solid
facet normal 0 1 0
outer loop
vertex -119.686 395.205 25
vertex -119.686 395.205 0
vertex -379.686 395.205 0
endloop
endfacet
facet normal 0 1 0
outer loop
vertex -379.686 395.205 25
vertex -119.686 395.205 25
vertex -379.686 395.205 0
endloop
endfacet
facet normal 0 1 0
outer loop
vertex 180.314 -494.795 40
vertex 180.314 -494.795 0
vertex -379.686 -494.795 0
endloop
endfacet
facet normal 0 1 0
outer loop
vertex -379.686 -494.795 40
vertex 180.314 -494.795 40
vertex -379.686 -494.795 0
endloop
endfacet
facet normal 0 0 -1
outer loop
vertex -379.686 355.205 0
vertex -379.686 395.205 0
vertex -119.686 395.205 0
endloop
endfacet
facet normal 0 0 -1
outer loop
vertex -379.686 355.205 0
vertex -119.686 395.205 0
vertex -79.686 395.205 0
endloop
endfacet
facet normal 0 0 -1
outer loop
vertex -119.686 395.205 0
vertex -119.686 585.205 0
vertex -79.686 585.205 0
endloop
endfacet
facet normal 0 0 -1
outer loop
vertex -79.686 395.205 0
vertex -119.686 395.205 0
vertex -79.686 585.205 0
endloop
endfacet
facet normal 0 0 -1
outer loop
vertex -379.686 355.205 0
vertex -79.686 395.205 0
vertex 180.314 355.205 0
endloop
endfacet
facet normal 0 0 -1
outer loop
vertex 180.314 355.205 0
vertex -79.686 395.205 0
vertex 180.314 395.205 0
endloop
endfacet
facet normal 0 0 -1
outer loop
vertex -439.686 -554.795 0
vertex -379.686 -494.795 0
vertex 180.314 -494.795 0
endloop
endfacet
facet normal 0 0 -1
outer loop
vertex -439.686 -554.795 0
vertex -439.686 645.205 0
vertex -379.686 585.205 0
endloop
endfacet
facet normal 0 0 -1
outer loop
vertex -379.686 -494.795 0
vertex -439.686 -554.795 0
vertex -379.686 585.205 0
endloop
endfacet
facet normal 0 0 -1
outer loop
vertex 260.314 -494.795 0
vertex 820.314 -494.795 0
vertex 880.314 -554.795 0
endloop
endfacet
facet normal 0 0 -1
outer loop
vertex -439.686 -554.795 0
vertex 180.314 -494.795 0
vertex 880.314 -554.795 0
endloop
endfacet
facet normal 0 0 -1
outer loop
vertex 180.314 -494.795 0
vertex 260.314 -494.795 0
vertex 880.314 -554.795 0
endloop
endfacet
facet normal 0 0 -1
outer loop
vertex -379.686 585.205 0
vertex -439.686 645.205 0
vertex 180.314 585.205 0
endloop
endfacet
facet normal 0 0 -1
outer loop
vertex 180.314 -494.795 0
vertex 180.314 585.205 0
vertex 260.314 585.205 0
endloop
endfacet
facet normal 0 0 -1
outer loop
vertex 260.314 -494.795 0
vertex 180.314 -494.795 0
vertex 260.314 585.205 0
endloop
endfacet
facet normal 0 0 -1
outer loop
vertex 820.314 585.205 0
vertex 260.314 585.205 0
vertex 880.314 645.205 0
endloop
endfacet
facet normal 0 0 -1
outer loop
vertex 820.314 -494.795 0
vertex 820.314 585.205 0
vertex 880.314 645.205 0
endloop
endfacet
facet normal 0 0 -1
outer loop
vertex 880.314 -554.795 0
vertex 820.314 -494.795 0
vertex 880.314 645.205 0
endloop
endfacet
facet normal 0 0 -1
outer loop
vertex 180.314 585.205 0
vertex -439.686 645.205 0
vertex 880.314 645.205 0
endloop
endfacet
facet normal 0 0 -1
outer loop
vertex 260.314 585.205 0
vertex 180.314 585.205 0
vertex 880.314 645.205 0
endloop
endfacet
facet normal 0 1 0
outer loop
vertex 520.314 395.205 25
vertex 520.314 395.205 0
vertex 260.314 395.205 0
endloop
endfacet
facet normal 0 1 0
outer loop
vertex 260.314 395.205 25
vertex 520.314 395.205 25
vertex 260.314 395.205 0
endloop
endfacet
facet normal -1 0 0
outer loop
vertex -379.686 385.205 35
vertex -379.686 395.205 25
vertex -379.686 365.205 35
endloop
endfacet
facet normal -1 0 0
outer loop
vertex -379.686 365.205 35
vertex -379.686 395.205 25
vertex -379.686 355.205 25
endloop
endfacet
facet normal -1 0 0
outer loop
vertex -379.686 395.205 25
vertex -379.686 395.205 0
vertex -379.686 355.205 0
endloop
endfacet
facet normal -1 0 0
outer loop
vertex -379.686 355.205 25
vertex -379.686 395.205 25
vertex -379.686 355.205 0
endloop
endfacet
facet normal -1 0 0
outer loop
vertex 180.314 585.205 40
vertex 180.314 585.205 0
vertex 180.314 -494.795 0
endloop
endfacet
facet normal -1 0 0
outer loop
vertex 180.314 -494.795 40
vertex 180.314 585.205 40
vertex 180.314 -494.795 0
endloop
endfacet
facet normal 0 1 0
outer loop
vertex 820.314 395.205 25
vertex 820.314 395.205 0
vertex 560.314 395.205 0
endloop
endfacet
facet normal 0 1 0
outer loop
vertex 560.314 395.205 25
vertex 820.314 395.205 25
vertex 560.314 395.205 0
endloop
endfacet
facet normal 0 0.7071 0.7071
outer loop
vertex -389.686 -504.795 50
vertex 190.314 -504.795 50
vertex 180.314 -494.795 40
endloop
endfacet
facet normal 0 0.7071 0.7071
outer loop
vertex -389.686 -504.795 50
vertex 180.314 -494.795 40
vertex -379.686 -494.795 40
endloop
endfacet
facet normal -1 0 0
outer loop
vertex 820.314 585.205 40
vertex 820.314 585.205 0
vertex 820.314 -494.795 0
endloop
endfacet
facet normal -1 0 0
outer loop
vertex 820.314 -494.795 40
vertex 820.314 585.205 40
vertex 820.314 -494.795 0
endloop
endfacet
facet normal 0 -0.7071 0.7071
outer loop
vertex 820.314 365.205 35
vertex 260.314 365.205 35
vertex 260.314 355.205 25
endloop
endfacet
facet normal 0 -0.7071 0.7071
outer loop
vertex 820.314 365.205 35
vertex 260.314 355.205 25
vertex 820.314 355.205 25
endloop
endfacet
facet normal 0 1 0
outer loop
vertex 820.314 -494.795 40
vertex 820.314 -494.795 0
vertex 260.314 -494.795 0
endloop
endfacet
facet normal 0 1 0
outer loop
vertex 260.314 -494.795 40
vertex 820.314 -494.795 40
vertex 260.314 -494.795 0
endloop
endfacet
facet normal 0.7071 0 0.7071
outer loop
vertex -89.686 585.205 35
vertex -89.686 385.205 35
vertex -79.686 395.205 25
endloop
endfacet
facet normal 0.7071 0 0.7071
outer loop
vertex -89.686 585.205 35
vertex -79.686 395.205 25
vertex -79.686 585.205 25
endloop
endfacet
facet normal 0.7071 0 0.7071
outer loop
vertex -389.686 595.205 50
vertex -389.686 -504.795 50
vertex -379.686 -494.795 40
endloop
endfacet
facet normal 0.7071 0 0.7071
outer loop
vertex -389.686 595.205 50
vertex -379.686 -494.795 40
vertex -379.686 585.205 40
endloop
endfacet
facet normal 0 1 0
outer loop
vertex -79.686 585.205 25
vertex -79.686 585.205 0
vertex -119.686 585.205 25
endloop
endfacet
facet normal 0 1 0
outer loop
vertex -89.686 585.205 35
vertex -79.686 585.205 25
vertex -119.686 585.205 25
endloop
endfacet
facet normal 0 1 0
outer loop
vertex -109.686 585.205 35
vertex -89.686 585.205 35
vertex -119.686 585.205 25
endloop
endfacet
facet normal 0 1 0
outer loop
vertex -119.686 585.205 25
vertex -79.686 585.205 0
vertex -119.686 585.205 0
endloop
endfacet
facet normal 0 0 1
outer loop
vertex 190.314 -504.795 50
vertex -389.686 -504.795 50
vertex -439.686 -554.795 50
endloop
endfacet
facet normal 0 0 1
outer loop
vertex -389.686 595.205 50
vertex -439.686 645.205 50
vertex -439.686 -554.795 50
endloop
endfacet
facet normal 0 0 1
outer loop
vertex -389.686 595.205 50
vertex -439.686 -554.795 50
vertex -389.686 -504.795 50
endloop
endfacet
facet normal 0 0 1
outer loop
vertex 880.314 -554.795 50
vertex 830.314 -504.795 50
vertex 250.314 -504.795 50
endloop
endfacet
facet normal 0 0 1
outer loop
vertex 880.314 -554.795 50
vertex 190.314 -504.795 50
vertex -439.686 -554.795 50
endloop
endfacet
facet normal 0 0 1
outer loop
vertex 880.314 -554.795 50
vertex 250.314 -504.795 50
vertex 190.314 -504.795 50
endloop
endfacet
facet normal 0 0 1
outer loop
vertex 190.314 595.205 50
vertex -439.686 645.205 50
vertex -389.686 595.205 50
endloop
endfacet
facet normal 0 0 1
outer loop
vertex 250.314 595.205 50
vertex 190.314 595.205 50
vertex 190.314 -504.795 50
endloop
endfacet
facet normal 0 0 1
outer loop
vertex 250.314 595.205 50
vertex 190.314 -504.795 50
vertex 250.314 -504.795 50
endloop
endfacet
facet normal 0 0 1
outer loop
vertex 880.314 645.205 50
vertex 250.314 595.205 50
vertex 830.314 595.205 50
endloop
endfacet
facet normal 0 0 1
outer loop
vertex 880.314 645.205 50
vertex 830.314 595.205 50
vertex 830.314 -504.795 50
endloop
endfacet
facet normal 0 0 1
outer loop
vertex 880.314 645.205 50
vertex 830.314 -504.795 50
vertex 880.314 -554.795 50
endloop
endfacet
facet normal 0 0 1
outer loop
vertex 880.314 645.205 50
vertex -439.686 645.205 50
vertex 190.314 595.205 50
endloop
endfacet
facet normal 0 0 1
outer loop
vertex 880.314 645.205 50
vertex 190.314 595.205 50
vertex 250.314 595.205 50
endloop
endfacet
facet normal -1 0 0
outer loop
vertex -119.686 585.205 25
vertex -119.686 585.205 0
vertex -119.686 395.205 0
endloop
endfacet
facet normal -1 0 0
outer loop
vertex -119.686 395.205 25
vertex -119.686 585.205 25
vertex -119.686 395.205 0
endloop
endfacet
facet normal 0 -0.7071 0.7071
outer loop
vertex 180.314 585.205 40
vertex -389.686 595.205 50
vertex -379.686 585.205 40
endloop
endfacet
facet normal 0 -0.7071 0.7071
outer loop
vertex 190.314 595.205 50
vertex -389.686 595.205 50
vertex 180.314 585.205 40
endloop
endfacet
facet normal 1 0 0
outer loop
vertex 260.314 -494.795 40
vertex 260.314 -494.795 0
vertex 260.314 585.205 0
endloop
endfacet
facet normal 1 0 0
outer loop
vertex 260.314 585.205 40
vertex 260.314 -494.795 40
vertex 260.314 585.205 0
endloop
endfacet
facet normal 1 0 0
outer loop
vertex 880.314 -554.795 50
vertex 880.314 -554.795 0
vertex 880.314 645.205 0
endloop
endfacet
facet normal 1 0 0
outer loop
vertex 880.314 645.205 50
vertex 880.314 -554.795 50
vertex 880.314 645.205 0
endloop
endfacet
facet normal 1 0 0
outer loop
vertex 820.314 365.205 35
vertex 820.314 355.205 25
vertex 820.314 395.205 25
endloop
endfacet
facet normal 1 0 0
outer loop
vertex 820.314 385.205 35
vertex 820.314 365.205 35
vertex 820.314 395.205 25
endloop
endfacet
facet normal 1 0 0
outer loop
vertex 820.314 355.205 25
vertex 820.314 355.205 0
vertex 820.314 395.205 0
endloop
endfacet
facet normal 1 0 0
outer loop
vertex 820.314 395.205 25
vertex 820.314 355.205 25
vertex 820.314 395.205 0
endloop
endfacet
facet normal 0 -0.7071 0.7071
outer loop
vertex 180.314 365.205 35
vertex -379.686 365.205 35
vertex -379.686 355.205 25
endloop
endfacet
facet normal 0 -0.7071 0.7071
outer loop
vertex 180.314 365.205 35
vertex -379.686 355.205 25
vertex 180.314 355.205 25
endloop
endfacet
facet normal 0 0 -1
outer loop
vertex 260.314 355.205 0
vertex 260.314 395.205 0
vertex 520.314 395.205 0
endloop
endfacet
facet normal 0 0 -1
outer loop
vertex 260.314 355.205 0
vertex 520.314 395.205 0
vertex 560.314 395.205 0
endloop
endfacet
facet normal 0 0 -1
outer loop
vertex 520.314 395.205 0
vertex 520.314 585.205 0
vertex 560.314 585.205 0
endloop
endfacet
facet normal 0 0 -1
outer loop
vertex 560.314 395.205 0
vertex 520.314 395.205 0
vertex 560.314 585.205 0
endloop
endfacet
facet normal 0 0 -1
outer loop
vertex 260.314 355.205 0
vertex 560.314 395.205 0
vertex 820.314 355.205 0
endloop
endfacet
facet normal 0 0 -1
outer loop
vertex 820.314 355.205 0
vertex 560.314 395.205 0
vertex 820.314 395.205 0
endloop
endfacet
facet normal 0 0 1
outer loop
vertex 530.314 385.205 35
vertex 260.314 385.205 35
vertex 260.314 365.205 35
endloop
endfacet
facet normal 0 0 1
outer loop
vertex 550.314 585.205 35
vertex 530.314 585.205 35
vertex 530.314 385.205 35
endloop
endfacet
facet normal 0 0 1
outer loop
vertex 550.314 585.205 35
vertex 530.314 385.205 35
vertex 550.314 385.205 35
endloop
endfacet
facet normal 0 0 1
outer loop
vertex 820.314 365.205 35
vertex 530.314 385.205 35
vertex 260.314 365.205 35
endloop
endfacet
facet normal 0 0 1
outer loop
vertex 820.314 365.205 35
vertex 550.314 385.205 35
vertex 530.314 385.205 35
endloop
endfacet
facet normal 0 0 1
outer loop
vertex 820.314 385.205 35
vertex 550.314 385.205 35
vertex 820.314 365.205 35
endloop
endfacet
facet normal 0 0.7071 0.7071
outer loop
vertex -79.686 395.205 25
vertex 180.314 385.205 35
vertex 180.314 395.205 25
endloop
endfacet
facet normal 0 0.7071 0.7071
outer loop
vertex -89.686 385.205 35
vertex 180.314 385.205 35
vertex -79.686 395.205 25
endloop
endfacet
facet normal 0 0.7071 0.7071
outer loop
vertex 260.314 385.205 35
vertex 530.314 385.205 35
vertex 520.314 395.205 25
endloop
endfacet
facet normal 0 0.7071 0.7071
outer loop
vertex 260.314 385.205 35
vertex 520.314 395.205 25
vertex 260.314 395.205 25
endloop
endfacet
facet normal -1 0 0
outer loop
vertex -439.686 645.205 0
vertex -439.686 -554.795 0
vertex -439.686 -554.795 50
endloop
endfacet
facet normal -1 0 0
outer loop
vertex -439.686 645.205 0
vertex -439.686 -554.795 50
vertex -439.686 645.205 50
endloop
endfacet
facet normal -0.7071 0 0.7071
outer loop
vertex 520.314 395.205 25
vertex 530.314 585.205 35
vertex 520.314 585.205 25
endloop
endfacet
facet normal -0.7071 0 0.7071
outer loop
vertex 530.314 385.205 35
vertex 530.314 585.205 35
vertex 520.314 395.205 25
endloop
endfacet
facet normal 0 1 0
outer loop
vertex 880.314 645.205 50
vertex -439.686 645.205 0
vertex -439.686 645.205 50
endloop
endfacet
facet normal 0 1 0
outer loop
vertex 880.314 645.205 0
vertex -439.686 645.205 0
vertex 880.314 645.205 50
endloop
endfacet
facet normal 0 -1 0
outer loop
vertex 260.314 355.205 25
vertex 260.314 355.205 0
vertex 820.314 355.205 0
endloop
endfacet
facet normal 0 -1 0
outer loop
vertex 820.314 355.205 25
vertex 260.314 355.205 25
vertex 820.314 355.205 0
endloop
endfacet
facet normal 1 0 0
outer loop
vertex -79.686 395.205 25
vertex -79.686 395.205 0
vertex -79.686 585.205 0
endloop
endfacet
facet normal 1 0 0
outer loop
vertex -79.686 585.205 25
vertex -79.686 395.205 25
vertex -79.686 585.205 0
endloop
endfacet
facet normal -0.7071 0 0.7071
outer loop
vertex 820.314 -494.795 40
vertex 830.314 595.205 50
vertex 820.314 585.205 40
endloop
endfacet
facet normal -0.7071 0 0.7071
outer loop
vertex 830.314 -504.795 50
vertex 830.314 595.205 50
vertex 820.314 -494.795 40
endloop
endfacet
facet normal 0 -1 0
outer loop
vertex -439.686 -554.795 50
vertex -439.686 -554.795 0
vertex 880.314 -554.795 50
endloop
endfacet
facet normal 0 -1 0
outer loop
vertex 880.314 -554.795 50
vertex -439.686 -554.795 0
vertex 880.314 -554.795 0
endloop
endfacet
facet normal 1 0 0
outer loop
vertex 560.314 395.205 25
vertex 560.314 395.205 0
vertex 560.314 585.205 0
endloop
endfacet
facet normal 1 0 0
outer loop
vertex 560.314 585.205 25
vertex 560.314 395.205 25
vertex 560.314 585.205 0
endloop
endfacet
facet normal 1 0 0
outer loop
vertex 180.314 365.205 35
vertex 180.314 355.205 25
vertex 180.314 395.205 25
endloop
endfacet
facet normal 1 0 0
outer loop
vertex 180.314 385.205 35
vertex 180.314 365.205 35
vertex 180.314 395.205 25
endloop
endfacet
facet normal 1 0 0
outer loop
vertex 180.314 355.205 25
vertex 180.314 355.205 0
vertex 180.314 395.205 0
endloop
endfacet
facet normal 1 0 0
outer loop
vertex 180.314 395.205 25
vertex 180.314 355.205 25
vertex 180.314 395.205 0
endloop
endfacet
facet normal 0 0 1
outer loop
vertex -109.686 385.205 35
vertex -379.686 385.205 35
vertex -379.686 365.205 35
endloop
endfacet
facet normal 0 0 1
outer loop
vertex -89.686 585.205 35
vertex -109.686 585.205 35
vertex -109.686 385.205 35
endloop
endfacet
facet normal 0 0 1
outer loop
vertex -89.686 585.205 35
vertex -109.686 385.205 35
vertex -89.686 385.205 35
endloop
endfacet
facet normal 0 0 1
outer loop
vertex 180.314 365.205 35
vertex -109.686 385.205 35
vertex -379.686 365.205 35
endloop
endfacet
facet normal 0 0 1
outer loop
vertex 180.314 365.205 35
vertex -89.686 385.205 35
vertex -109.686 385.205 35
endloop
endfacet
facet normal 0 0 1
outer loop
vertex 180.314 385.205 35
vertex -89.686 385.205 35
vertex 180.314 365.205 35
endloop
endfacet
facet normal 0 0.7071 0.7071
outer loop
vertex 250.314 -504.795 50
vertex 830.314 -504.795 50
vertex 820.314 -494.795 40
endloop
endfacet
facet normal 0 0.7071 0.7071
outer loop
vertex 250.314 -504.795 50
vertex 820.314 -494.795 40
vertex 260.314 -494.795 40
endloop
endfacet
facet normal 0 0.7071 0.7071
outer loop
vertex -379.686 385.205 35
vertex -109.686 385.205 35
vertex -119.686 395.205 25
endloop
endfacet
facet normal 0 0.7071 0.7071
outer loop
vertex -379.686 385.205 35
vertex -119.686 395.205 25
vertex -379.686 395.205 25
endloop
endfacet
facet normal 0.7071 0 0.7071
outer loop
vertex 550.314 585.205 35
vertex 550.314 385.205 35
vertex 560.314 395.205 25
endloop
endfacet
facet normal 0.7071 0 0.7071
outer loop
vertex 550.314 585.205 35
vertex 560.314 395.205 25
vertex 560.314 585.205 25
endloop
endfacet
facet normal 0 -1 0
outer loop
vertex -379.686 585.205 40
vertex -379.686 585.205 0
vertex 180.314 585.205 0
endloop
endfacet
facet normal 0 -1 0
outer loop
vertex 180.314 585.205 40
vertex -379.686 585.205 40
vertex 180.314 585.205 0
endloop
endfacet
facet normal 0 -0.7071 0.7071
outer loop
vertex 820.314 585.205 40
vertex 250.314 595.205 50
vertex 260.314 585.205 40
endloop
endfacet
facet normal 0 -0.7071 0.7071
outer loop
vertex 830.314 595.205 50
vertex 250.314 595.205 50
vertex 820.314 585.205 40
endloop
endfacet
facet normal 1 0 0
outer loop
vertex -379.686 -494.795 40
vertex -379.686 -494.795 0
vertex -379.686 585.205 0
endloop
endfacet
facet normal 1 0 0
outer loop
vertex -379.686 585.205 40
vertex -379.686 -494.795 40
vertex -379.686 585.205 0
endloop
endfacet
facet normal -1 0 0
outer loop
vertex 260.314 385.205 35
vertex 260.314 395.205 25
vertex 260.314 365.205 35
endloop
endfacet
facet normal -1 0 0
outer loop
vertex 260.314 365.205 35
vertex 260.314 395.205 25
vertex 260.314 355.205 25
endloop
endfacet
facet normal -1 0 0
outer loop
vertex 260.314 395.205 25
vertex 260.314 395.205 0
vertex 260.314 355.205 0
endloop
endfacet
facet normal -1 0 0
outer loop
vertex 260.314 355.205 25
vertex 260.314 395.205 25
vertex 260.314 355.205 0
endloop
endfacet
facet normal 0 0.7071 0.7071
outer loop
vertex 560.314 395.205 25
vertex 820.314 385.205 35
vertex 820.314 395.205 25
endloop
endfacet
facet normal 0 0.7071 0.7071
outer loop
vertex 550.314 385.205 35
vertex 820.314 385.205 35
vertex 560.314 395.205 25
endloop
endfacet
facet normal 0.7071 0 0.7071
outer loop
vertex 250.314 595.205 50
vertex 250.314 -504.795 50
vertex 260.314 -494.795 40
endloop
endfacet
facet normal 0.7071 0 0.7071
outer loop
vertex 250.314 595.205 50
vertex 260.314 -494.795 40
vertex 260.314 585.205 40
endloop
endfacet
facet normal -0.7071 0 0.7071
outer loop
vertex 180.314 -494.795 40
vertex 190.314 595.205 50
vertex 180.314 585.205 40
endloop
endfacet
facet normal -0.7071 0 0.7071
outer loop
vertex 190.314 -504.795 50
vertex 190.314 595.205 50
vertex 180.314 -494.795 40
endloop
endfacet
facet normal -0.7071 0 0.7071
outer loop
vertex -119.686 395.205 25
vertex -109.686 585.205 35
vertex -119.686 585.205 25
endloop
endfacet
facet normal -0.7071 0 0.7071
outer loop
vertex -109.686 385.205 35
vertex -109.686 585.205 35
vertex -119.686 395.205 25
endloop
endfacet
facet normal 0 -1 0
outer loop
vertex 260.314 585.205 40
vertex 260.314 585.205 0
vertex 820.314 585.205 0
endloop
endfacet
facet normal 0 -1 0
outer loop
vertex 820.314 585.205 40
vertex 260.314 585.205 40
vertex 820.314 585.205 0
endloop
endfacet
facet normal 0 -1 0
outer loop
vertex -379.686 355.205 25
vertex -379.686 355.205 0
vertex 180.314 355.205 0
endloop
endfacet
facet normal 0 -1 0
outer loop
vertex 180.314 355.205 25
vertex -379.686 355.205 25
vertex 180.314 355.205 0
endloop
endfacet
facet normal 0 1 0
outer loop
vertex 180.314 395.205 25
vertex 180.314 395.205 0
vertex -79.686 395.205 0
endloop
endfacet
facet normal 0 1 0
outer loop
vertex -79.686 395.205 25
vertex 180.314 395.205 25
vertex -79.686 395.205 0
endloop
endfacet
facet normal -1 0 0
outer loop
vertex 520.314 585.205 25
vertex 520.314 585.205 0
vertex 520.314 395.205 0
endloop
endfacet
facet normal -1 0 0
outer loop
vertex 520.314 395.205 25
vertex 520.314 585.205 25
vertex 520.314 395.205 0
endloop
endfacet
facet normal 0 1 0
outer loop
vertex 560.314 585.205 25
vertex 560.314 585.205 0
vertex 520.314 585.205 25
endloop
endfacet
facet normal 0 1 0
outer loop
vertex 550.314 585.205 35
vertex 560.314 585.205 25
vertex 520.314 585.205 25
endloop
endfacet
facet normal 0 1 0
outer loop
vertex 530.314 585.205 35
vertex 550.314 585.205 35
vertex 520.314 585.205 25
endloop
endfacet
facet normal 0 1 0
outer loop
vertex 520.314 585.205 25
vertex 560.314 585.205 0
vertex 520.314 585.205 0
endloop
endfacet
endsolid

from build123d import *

# Parameters (mm, degrees)
F0_W      = 1320
F0_H      = 1200
F1_DEPTH  = 50
F2_DEPTH  = 35
F3_SIZE   = 10
F3_2_SIZE = 10
F3_3_SIZE = 10


with BuildPart() as f1:
    # F0 (on Top) → F1 (new body)
    with BuildSketch(Plane.XY):
        with Locations((220.3141621128, 45.2047318473)):
            Rectangle(F0_W, F0_H)
        Polygon((-379.6858378872, -494.7952681527), (-379.6858378872, 355.2047318473), (-379.6858378872, 395.2047318473), (-379.6858378872, 585.2047318473), (-119.6858378872, 585.2047318473), (-79.6858378872, 585.2047318473), (180.3141621128, 585.2047318473), (180.3141621128, 395.2047318473), (180.3141621128, 355.2047318473), (180.3141621128, -494.7952681527), align=None, mode=Mode.SUBTRACT)
        Polygon((260.3141621128, -494.7952681527), (260.3141621128, 355.2047318473), (260.3141621128, 395.2047318473), (260.3141621128, 585.2047318473), (520.3141621128, 585.2047318473), (560.3141621128, 585.2047318473), (820.3141621128, 585.2047318473), (820.3141621128, 395.2047318473), (820.3141621128, 355.2047318473), (820.3141621128, -494.7952681527), align=None, mode=Mode.SUBTRACT)
    extrude(amount=F1_DEPTH)

    # F3
    f3_edges = [f1.edges().sort_by_distance(p)[0] for p in [
        (-379.685838, 45.204732, 50),
        (-99.685838, 585.204732, 50),
        (180.314162, 45.204732, 50),
        (260.314162, 45.204732, 50),
        (540.314162, 585.204732, 50),
        (820.314162, 45.204732, 50),
        (540.314162, -494.795268, 50),
        (-99.685838, -494.795268, 50),
    ]]
    chamfer(f3_edges, length=F3_SIZE)


with BuildPart() as f2:
    # F0 (on Top) → F2 (new body)
    with BuildSketch(Plane.XY):
        Polygon((-379.6858378872, 395.2047318473), (-379.6858378872, 355.2047318473), (180.3141621128, 355.2047318473), (180.3141621128, 395.2047318473), (-79.6858378872, 395.2047318473), (-79.6858378872, 585.2047318473), (-119.6858378872, 585.2047318473), (-119.6858378872, 395.2047318473), align=None)
    extrude(amount=F2_DEPTH)

    # F3#2
    f3_2_edges = [f2.edges().sort_by_distance(p)[0] for p in [
        (-99.685838, 355.204732, 35),
        (50.314162, 395.204732, 35),
        (-79.685838, 490.204732, 35),
        (-119.685838, 490.204732, 35),
        (-249.685838, 395.204732, 35),
    ]]
    chamfer(f3_2_edges, length=F3_2_SIZE)


with BuildPart() as f2b:
    # F0 (on Top) → F2, piece 2 (new body)
    with BuildSketch(Plane.XY):
        Polygon((260.3141621128, 395.2047318473), (260.3141621128, 355.2047318473), (820.3141621128, 355.2047318473), (820.3141621128, 395.2047318473), (560.3141621128, 395.2047318473), (560.3141621128, 585.2047318473), (520.3141621128, 585.2047318473), (520.3141621128, 395.2047318473), align=None)
    extrude(amount=F2_DEPTH)

    # F3#3
    f3_3_edges = [f2b.edges().sort_by_distance(p)[0] for p in [
        (540.314162, 355.204732, 35),
        (390.314162, 395.204732, 35),
        (560.314162, 490.204732, 35),
        (690.314162, 395.204732, 35),
        (520.314162, 490.204732, 35),
    ]]
    chamfer(f3_3_edges, length=F3_3_SIZE)


solid = Compound([f1.part, f2.part, f2b.part])
